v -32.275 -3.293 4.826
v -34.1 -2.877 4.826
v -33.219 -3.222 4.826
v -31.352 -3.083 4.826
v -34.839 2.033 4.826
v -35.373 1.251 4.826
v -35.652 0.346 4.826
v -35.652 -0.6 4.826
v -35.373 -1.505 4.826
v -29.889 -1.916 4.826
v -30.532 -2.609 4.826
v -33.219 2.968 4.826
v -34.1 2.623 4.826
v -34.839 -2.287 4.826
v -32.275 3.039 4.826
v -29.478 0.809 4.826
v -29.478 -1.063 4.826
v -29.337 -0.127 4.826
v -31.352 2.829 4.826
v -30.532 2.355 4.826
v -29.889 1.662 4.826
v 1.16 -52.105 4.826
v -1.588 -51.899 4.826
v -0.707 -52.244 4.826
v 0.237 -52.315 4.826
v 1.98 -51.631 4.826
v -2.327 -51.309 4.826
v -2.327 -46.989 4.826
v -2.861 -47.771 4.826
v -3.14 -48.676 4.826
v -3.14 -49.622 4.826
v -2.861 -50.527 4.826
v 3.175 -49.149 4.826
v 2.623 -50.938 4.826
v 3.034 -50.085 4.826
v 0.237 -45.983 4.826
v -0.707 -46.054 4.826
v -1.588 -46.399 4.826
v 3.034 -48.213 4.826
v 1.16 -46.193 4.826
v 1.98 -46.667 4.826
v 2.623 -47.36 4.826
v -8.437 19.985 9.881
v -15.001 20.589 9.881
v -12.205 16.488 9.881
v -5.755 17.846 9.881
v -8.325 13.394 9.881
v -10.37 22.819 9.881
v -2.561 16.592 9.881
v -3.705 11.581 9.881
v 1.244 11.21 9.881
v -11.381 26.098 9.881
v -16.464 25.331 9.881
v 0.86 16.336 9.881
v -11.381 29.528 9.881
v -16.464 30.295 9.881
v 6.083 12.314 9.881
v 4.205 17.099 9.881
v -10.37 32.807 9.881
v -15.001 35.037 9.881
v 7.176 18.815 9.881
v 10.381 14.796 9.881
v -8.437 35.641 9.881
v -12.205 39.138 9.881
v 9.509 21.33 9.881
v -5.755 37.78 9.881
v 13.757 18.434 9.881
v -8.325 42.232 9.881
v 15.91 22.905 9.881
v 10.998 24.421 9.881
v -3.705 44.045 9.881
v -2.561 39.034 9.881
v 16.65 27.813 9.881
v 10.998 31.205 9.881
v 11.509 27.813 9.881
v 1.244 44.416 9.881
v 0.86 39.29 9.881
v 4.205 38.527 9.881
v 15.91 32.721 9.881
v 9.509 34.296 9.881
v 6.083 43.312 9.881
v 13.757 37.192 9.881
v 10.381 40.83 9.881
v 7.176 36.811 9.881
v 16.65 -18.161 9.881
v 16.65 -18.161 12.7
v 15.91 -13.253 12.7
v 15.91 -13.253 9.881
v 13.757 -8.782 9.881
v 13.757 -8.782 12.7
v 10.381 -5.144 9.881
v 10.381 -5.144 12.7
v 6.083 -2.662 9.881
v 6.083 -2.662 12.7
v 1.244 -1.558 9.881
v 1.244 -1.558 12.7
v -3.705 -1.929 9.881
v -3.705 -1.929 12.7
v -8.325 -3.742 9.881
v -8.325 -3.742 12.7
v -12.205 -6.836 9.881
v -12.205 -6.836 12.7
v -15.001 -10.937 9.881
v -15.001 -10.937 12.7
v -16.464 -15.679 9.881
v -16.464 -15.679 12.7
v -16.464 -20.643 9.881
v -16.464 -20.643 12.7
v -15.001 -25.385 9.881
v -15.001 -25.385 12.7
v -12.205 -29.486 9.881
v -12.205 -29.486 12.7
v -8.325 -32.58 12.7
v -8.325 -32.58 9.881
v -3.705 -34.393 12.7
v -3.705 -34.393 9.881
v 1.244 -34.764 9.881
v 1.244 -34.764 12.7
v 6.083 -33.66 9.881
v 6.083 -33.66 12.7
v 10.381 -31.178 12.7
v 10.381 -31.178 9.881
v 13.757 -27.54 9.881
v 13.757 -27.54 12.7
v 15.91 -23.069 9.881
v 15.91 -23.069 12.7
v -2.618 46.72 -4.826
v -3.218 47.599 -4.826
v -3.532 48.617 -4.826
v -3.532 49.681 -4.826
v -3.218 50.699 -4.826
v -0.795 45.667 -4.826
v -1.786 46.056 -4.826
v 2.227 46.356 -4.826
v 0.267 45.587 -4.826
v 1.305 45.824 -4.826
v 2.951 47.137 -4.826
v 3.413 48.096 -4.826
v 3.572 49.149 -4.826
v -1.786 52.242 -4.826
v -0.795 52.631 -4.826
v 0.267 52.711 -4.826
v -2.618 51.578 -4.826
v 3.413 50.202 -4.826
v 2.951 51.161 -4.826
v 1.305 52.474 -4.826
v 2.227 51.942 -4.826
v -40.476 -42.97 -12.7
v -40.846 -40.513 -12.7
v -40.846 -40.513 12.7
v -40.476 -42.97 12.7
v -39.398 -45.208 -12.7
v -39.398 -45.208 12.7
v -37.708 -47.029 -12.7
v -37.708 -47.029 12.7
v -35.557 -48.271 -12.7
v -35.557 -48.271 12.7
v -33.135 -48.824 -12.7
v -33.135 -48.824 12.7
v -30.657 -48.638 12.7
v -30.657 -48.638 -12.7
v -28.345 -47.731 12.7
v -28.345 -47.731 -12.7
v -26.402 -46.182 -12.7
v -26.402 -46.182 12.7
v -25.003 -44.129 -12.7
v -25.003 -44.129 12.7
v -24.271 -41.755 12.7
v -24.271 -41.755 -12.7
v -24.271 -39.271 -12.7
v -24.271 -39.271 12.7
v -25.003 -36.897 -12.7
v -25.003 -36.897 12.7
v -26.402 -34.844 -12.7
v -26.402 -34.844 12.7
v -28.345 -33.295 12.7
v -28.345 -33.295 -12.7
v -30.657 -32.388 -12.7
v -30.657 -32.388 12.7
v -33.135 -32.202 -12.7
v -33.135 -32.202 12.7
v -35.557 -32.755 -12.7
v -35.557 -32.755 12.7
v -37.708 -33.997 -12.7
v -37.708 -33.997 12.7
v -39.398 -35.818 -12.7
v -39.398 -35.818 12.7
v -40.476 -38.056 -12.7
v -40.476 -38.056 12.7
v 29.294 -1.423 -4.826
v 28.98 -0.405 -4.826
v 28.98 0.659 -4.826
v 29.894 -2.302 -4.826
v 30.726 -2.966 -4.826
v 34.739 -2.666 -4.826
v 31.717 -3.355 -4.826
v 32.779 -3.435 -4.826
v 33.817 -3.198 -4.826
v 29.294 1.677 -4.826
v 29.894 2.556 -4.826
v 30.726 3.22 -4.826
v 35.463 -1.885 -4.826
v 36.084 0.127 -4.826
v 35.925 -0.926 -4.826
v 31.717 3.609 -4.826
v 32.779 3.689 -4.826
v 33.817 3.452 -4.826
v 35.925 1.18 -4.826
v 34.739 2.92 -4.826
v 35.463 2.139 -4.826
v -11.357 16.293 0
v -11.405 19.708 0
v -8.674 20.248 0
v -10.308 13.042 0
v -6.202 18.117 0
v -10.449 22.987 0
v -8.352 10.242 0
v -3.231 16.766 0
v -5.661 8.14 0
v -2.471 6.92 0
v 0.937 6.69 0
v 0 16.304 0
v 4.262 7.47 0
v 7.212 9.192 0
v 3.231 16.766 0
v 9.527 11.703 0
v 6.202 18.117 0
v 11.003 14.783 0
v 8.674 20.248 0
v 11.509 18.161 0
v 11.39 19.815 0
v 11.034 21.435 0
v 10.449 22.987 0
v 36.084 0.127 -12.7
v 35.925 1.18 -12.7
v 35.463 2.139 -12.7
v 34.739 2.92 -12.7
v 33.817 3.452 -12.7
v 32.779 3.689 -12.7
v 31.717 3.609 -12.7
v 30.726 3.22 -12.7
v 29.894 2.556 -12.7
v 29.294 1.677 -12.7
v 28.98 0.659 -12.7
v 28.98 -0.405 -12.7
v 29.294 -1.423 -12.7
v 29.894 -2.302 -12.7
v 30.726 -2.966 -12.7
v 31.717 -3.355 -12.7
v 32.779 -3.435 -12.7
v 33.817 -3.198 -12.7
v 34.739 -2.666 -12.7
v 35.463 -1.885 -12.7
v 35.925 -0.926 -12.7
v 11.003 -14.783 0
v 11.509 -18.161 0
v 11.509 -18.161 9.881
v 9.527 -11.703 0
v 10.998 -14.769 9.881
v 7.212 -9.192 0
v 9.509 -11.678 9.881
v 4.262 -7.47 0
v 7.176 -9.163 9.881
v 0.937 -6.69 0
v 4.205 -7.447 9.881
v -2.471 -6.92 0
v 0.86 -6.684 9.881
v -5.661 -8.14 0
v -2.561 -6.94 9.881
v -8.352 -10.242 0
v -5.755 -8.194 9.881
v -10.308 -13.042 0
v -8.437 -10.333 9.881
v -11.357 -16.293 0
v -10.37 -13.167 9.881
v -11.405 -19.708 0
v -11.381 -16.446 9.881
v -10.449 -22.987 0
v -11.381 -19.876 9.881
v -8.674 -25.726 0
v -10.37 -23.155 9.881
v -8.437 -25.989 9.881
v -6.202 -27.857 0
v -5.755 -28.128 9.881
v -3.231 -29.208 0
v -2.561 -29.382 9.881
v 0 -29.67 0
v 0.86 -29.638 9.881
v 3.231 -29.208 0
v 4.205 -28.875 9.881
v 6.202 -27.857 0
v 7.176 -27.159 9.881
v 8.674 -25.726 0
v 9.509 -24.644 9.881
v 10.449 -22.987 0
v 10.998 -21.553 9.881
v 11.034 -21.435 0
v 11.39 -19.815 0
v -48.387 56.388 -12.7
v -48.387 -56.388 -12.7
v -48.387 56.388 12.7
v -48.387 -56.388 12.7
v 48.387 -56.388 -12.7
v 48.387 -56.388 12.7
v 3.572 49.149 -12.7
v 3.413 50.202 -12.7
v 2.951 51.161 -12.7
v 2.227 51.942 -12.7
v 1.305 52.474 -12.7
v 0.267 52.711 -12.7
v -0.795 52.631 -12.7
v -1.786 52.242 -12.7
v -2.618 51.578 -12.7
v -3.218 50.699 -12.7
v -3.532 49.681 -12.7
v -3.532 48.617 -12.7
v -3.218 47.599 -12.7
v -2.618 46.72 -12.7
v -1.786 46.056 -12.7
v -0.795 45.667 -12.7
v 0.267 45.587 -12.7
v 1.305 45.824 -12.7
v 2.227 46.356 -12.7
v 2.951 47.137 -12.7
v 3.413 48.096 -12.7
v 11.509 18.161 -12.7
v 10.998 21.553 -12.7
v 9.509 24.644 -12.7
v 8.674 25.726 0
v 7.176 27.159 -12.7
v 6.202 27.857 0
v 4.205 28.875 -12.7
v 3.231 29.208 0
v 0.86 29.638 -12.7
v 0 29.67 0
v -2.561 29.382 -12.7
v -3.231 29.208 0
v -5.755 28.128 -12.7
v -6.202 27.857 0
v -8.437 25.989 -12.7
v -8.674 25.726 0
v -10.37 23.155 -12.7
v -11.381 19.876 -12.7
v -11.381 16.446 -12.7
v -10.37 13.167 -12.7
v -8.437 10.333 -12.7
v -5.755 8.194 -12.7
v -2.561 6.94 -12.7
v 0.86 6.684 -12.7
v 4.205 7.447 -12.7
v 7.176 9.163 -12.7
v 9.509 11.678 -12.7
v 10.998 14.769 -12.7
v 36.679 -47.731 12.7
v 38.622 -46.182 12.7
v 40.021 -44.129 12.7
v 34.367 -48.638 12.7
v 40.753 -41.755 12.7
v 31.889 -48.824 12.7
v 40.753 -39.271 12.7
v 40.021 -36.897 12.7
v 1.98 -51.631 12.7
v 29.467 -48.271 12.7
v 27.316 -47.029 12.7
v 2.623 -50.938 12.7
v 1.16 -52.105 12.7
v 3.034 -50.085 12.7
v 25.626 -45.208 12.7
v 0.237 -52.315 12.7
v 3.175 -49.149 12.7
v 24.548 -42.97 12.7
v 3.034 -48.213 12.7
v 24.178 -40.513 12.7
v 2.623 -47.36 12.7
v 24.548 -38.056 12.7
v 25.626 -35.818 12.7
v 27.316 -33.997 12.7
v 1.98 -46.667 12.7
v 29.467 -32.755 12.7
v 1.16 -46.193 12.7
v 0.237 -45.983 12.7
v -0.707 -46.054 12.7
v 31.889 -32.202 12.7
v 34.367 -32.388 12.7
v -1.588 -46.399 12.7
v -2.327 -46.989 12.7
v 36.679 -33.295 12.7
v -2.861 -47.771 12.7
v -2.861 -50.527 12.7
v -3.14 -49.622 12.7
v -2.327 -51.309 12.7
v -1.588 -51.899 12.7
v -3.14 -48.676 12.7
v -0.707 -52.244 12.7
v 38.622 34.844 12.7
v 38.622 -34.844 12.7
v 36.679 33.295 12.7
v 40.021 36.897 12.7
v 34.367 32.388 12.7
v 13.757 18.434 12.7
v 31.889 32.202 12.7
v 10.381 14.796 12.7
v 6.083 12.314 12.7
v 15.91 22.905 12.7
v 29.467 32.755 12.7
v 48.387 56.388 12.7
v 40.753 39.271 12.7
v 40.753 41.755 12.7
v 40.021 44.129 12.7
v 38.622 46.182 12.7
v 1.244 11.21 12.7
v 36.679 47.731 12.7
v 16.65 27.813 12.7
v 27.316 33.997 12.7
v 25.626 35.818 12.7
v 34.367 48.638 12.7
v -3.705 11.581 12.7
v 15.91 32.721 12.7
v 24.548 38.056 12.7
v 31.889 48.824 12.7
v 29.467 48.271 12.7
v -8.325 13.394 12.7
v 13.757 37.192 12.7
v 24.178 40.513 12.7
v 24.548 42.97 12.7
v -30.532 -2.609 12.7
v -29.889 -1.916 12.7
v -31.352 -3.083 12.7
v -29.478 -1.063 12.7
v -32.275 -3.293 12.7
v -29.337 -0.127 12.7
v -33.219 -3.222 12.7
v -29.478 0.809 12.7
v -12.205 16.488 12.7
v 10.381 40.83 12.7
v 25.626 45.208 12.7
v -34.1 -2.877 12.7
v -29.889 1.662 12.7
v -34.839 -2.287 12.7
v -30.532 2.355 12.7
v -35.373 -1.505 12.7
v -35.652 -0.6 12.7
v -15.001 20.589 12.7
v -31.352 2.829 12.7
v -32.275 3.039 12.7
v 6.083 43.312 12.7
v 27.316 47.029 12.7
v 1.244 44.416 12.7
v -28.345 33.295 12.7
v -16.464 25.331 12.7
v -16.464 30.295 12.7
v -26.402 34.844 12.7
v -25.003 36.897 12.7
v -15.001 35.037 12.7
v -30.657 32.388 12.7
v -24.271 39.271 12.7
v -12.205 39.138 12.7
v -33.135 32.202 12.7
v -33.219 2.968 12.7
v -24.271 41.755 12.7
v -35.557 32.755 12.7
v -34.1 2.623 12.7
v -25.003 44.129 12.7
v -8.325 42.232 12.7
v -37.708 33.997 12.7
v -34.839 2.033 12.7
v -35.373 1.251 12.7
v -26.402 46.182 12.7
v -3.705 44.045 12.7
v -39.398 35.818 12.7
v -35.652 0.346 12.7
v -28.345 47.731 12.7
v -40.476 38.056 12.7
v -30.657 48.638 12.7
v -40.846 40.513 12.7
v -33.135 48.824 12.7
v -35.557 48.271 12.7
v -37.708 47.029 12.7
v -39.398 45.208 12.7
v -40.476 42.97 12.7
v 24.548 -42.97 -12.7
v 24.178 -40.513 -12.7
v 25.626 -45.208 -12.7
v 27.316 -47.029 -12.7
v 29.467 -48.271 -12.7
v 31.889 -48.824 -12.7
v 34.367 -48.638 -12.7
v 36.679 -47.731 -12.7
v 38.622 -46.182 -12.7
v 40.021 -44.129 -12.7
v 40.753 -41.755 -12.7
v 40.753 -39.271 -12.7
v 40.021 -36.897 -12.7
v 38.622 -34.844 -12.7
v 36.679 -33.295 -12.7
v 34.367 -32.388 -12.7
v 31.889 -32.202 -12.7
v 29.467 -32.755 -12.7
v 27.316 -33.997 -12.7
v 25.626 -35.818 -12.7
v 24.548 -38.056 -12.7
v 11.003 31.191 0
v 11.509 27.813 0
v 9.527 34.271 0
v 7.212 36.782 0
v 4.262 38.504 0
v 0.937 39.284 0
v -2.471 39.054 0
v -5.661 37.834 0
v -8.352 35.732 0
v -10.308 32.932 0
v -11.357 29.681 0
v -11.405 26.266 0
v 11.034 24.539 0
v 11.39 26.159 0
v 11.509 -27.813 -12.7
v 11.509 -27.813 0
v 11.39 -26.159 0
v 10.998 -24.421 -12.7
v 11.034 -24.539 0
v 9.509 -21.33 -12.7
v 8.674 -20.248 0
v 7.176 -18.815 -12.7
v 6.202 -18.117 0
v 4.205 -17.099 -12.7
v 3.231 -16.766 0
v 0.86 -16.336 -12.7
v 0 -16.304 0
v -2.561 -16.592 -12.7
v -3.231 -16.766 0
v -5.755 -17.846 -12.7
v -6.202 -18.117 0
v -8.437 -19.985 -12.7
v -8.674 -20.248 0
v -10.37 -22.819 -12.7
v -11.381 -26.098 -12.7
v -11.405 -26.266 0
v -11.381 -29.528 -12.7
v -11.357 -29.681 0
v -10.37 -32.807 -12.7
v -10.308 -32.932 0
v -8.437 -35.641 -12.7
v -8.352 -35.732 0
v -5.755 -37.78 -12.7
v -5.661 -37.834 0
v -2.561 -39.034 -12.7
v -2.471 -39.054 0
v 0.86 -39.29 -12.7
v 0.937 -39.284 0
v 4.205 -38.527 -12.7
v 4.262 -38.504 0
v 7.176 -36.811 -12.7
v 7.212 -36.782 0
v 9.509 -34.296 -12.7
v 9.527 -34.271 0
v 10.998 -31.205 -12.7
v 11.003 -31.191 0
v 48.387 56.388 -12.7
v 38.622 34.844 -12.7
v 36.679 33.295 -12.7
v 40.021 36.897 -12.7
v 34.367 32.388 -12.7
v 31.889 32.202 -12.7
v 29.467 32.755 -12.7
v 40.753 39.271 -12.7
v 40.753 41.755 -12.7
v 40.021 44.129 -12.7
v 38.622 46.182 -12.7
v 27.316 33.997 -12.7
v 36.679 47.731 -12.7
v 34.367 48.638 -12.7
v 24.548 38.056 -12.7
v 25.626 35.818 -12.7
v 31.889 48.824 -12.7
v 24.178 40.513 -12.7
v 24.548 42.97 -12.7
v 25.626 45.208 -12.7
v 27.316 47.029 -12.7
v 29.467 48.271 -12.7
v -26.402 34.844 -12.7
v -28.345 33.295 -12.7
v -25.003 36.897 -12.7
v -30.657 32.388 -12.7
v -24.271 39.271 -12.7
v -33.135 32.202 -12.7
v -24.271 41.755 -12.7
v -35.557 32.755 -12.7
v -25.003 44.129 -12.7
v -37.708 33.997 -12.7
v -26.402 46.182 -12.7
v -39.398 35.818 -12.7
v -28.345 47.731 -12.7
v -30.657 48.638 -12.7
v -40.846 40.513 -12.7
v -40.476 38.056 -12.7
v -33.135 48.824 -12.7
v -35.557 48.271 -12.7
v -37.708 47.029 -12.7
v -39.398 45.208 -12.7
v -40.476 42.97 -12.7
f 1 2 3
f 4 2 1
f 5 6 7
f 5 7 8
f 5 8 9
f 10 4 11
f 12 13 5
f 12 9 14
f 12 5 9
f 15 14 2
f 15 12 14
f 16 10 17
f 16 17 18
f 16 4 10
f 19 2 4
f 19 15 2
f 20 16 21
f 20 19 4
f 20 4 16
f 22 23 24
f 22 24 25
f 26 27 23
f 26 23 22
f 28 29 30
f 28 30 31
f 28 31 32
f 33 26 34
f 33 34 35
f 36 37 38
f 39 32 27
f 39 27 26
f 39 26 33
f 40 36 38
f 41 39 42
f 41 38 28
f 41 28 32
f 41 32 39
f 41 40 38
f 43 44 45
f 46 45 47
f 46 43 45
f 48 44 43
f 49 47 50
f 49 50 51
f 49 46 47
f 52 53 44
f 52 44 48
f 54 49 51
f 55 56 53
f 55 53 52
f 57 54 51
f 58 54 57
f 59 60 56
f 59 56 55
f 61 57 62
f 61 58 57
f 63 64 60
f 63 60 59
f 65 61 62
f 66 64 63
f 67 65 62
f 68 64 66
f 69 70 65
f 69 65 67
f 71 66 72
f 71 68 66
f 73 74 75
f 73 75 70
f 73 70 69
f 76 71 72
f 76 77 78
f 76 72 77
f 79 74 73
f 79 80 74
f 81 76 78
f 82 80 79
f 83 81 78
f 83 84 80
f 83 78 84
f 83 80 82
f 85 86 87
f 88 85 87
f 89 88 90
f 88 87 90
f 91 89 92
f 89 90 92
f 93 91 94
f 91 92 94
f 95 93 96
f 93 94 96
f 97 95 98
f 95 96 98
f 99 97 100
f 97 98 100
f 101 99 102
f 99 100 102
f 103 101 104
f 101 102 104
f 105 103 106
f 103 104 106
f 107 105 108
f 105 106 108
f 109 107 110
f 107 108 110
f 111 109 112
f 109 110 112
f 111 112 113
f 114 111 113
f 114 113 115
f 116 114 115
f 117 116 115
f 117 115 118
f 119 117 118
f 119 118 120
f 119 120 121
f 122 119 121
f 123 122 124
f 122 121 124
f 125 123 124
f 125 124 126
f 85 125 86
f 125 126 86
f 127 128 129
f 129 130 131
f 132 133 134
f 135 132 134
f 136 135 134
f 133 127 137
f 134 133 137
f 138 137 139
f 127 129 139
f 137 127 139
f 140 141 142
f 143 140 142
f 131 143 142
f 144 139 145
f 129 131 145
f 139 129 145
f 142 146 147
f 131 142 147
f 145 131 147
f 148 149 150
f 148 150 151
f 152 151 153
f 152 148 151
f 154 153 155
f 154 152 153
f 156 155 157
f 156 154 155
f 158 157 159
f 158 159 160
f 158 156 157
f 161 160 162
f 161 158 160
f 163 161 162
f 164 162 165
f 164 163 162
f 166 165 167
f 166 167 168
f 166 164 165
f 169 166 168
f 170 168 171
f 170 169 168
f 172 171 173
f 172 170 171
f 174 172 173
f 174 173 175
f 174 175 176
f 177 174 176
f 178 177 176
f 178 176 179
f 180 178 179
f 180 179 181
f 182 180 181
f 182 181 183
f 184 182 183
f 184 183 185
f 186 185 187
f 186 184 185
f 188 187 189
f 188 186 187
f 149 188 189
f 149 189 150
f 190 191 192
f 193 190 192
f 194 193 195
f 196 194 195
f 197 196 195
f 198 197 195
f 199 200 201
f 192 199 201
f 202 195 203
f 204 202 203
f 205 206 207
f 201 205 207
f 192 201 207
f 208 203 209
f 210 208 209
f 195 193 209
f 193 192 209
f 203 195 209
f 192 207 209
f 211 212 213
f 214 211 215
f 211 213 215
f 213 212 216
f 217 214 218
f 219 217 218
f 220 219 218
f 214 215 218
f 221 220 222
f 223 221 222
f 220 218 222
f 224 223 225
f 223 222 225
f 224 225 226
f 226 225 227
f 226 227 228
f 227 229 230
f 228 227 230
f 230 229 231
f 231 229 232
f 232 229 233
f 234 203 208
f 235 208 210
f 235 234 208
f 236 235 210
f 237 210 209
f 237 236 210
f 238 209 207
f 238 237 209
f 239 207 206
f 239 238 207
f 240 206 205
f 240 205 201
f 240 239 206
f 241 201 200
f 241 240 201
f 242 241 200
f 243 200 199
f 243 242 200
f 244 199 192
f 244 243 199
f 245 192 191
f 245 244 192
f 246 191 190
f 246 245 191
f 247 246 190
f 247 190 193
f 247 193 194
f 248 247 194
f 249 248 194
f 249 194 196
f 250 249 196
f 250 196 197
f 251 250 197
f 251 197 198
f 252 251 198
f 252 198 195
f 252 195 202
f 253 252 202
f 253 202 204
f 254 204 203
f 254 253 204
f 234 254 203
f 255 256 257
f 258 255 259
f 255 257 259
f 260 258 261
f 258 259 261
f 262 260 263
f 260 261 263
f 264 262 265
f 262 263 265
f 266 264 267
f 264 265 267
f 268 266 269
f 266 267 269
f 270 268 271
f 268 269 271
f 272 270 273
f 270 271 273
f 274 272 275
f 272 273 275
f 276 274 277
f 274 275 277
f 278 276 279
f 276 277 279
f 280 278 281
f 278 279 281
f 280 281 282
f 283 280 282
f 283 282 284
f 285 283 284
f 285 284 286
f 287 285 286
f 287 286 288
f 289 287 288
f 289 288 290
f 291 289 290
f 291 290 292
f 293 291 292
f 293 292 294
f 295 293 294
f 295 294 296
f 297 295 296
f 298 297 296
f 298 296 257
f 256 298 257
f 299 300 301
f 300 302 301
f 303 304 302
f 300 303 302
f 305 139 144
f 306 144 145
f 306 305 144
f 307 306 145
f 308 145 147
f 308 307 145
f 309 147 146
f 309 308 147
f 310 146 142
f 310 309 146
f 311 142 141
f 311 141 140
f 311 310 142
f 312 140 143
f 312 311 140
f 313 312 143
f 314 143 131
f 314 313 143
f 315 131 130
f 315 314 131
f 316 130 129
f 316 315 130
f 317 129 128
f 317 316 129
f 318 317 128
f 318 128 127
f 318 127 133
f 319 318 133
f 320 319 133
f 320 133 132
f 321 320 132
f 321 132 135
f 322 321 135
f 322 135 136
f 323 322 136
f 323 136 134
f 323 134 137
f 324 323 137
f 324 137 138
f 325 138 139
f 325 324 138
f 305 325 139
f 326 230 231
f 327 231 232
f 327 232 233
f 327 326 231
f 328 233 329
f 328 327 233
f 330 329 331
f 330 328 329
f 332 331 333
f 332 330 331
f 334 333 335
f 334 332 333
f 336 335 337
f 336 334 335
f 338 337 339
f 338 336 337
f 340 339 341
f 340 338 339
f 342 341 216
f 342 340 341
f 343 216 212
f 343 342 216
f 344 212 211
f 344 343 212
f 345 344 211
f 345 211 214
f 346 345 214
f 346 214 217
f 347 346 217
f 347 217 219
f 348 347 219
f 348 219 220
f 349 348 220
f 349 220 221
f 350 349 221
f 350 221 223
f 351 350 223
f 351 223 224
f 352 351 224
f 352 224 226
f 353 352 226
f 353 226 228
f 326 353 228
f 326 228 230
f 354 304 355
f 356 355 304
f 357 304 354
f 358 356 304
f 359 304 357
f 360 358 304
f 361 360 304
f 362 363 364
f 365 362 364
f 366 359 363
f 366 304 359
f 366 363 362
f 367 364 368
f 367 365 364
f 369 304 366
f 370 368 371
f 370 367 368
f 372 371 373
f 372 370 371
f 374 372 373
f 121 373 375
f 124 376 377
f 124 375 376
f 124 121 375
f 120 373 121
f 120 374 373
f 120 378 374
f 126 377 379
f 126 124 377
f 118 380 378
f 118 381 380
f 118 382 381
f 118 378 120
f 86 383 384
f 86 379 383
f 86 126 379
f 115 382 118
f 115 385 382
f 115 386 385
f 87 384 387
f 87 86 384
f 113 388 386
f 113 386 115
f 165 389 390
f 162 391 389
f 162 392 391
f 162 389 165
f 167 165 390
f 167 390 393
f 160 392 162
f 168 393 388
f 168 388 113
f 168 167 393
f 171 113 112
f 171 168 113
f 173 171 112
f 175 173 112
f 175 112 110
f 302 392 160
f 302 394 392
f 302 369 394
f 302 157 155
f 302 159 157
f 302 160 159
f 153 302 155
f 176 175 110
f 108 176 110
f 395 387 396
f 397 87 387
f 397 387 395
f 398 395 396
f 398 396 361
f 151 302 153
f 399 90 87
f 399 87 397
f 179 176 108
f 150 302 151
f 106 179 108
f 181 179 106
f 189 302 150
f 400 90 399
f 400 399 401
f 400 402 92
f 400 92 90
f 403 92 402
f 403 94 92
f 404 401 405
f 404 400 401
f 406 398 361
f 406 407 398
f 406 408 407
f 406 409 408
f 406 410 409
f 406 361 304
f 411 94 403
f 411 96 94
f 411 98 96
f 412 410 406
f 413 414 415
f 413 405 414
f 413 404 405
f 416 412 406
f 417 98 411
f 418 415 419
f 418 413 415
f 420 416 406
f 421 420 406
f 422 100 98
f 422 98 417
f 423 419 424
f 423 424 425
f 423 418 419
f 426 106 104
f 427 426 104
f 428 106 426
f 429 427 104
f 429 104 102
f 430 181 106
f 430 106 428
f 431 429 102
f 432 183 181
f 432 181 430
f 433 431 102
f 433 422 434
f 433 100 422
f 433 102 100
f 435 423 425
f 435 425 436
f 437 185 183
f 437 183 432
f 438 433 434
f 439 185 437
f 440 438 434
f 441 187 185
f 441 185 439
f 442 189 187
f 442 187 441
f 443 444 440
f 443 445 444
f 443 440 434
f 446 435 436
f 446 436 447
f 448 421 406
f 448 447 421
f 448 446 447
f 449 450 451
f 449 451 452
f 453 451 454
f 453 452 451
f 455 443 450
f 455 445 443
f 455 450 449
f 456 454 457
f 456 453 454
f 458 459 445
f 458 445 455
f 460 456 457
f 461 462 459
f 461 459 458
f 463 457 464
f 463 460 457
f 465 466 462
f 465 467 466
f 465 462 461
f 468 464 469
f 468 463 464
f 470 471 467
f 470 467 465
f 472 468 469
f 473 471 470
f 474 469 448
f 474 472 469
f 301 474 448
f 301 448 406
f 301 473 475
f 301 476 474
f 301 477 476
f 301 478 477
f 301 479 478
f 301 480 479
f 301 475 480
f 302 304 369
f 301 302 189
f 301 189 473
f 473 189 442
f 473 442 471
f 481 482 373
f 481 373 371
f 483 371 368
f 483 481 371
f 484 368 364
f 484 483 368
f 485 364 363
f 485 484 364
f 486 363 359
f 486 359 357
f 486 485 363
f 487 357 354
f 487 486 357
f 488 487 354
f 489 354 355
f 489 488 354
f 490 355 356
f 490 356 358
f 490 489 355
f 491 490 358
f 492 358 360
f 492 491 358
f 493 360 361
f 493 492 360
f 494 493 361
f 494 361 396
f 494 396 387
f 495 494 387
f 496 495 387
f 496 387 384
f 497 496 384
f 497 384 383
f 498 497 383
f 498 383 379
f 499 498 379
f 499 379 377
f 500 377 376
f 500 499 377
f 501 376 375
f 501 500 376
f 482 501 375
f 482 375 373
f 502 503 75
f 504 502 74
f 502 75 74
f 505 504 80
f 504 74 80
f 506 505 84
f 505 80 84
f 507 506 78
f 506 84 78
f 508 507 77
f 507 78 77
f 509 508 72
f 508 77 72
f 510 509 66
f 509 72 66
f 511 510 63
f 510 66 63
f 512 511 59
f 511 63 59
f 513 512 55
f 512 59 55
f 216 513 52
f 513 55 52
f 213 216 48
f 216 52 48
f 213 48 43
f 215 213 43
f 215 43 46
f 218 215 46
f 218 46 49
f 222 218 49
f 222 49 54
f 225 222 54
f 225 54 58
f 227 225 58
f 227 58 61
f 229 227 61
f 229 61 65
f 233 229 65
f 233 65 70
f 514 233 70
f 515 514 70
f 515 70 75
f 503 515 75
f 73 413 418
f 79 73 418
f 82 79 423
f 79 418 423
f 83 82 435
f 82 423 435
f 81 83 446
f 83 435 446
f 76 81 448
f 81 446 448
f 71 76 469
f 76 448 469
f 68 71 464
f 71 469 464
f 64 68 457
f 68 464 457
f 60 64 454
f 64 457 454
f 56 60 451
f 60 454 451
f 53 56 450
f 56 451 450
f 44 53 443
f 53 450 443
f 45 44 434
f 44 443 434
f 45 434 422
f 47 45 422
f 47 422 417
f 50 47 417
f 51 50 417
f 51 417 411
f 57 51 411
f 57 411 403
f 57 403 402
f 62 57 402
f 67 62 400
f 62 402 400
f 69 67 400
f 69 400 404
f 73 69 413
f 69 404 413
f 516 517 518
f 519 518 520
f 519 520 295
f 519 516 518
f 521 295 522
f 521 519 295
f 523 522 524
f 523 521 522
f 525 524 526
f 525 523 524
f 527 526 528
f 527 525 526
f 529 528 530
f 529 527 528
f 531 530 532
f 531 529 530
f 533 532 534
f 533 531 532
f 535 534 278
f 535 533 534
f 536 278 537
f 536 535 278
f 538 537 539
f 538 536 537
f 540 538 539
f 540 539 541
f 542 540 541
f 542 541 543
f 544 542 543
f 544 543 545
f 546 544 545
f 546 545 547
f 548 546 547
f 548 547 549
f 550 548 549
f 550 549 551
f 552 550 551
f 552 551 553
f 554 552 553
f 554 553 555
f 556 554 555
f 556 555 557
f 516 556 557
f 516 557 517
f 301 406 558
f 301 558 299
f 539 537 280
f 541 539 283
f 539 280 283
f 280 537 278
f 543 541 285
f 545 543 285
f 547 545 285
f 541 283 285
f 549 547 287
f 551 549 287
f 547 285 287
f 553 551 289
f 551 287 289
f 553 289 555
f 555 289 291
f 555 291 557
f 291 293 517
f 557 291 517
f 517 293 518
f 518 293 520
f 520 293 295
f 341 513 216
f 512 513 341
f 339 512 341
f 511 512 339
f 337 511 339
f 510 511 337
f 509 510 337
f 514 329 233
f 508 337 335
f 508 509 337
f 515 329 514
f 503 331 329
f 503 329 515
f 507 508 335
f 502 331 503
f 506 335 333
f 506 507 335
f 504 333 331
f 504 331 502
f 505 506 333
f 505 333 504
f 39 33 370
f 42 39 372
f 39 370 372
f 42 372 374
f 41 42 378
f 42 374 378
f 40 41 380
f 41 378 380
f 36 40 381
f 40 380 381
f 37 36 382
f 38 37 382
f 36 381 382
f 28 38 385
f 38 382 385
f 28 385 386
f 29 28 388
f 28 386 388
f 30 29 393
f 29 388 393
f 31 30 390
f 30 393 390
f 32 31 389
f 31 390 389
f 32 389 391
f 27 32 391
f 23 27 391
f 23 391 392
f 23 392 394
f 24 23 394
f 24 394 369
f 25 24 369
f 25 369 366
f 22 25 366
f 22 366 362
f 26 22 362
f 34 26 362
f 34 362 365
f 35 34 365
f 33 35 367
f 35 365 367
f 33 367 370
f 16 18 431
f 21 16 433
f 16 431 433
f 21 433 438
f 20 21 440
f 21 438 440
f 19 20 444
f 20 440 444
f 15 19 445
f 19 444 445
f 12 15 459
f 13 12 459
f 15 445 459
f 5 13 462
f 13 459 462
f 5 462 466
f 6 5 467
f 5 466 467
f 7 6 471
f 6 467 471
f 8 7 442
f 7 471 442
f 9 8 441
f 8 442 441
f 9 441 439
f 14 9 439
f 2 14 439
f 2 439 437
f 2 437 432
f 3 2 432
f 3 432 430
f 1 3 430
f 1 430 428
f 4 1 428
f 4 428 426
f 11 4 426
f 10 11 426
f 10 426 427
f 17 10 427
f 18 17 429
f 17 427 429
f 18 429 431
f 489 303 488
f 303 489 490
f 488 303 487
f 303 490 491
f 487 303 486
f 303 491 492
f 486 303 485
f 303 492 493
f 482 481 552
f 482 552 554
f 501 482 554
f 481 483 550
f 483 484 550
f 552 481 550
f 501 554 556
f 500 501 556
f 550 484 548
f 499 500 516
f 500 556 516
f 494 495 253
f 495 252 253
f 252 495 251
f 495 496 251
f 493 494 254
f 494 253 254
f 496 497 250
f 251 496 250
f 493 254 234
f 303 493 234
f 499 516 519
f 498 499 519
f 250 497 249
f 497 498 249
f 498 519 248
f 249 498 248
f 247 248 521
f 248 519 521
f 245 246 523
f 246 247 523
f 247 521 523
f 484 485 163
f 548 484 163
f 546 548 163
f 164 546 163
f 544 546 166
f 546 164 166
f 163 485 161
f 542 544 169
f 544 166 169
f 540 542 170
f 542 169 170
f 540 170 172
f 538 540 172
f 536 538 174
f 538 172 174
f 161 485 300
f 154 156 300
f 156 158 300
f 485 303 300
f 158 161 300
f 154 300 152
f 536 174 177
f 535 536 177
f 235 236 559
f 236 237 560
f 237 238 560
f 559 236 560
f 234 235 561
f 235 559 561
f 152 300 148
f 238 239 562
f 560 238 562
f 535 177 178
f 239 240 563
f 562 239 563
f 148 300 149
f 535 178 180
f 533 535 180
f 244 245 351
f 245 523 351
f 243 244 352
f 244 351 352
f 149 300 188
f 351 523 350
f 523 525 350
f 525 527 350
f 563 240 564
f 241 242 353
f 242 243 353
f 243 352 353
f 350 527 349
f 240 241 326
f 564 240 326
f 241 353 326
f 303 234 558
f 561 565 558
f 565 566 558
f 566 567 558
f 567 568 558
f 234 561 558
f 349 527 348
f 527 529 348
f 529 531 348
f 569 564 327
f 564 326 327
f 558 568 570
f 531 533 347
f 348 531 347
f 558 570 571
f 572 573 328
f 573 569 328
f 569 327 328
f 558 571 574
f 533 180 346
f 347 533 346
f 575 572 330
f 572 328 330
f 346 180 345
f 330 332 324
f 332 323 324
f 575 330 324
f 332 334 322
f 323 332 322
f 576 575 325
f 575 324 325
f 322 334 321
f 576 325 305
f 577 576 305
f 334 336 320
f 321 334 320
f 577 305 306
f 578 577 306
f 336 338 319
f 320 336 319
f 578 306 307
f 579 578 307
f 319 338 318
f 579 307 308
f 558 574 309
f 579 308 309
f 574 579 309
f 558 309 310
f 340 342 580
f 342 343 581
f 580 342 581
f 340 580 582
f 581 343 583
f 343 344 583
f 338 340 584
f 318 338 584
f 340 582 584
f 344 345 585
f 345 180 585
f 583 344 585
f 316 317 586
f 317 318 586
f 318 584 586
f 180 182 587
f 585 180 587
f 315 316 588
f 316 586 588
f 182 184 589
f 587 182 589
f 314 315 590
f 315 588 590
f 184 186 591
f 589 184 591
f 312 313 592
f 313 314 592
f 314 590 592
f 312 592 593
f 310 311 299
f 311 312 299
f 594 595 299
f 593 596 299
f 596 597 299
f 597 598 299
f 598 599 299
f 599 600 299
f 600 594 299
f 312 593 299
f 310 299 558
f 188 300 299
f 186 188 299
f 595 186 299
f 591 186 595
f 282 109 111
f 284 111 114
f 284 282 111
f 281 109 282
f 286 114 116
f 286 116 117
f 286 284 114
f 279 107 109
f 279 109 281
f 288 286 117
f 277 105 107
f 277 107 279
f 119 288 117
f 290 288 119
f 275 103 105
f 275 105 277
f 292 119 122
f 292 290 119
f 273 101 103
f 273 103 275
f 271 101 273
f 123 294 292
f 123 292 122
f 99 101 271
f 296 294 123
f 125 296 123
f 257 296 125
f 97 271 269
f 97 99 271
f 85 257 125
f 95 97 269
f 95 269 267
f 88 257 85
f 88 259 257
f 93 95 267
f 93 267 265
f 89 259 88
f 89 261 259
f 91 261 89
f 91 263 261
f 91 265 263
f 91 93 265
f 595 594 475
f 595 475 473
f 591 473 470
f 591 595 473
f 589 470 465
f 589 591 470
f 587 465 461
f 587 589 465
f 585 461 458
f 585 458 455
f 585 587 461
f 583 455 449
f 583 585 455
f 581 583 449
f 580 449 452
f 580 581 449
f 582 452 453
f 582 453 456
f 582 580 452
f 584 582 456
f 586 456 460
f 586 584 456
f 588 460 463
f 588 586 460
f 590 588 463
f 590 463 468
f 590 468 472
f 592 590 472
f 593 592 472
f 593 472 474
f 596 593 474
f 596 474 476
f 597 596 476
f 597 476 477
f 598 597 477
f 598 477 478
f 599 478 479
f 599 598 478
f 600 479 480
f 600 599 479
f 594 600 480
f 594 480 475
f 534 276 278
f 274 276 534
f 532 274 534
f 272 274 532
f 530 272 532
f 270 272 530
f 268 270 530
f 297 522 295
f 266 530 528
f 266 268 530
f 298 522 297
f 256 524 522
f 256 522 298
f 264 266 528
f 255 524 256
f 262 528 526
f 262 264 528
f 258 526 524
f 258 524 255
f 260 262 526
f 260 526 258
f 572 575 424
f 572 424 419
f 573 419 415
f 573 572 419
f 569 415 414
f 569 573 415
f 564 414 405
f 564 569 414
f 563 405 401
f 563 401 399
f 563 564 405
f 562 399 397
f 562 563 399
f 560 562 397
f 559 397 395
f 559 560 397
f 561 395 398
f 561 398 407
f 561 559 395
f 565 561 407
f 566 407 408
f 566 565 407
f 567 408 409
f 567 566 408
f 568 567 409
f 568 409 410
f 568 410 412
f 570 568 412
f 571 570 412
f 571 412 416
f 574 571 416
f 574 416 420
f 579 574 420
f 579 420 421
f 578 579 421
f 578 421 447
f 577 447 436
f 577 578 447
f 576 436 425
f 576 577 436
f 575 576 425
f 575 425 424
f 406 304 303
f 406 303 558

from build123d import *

# Parameters (mm, degrees)
SKETCH1_W           = 112.776
SKETCH1_H           = 96.774
BOSS_EXTRUDE1_DEPTH = 12.7
CUT_EXTRUDE2_START  = -12.7
SKETCH2_R           = 8.334375
CUT_EXTRUDE2_DEPTH  = 25.4
CUT_EXTRUDE4_START  = -12.7
SKETCH3_R           = 8.334375
CUT_EXTRUDE4_DEPTH  = 25.4
CUT_EXTRUDE6_START  = -12.7
SKETCH4_R           = 11.509375
CUT_EXTRUDE6_DEPTH  = 12.7
CUT_EXTRUDE8_START  = -12.7
SKETCH5_R           = 11.509375
CUT_EXTRUDE8_DEPTH  = 12.7
CUT_EXTRUDE10_START = 12.7
SKETCH6_R           = 11.509375
CUT_EXTRUDE10_DEPTH = 12.7
CUT_EXTRUDE12_START = 12.7
SKETCH7_R           = 11.509375
CUT_EXTRUDE12_DEPTH = 12.7
CUT_EXTRUDE14_START = 12.7
SKETCH8_R           = 16.6497
CUT_EXTRUDE14_DEPTH = 2.8194
CUT_EXTRUDE16_START = 12.7
SKETCH9_R           = 16.6497
CUT_EXTRUDE16_DEPTH = 2.8194
CUT_EXTRUDE18_START = -12.7
SKETCH10_R          = 3.571875
CUT_EXTRUDE18_DEPTH = 7.874
CUT_EXTRUDE20_START = -12.7
SKETCH11_R          = 3.571875
CUT_EXTRUDE20_DEPTH = 7.874
CUT_EXTRUDE22_START = 12.7
SKETCH12_R          = 3.175
CUT_EXTRUDE22_DEPTH = 7.874
CUT_EXTRUDE24_START = 12.7
SKETCH13_R          = 3.175
CUT_EXTRUDE24_DEPTH = 7.874


with BuildPart() as part:
    # Sketch1 → Boss-Extrude1 (new, symmetric)
    with BuildSketch(Plane(origin=(0, 0, 0), x_dir=(0, 1, 0), z_dir=(0, 0, 1))):
        Rectangle(SKETCH1_W, SKETCH1_H)
    extrude(amount=BOSS_EXTRUDE1_DEPTH, both=True)

    # Sketch2 → Cut-Extrude2 (cut)
    with BuildSketch(Plane(origin=(0, 0, 0), x_dir=(0, 1, 0), z_dir=(0, 0, 1)).offset(CUT_EXTRUDE2_START)):
        with Locations(Location((-40.513, -32.512, 0), (0, 0, 90))):
            Circle(SKETCH2_R)
    extrude(amount=CUT_EXTRUDE2_DEPTH, mode=Mode.SUBTRACT)

    # Sketch3 → Cut-Extrude4 (cut)
    with BuildSketch(Plane(origin=(0, 0, 0), x_dir=(0, 1, 0), z_dir=(0, 0, 1)).offset(CUT_EXTRUDE4_START)):
        with Locations(Location((40.513, -32.512, 0), (0, 0, 90))):
            Circle(SKETCH3_R)
        with Locations(Location((-40.513, 32.512, 0), (0, 0, 90))):
            Circle(SKETCH3_R)
        with Locations(Location((40.513, 32.512, 0), (0, 0, 90))):
            Circle(SKETCH3_R)
    extrude(amount=CUT_EXTRUDE4_DEPTH, mode=Mode.SUBTRACT)

    # Sketch4 → Cut-Extrude6 (cut)
    with BuildSketch(Plane(origin=(0, 0, 0), x_dir=(0, 1, 0), z_dir=(0, 0, 1)).offset(CUT_EXTRUDE6_START)):
        with Locations(Location((-27.813, 0, 0), (0, 0, 270))):
            Circle(SKETCH4_R)
    extrude(amount=CUT_EXTRUDE6_DEPTH, mode=Mode.SUBTRACT)

    # Sketch5 → Cut-Extrude8 (cut)
    with BuildSketch(Plane(origin=(0, 0, 0), x_dir=(0, 1, 0), z_dir=(0, 0, 1)).offset(CUT_EXTRUDE8_START)):
        with Locations(Location((18.161, 0, 0), (0, 0, 270))):
            Circle(SKETCH5_R)
    extrude(amount=CUT_EXTRUDE8_DEPTH, mode=Mode.SUBTRACT)

    # Sketch6 → Cut-Extrude10 (cut)
    with BuildSketch(Plane(origin=(0, 0, 0), x_dir=(0, 1, 0), z_dir=(0, 0, 1)).offset(CUT_EXTRUDE10_START)):
        with Locations(Location((-18.161, 0, 0), (0, 0, 270))):
            Circle(SKETCH6_R)
    extrude(amount=-CUT_EXTRUDE10_DEPTH, mode=Mode.SUBTRACT)

    # Sketch7 → Cut-Extrude12 (cut)
    with BuildSketch(Plane(origin=(0, 0, 0), x_dir=(0, 1, 0), z_dir=(0, 0, 1)).offset(CUT_EXTRUDE12_START)):
        with Locations(Location((27.813, 0, 0), (0, 0, 270))):
            Circle(SKETCH7_R)
    extrude(amount=-CUT_EXTRUDE12_DEPTH, mode=Mode.SUBTRACT)

    # Sketch8 → Cut-Extrude14 (cut)
    with BuildSketch(Plane(origin=(0, 0, 0), x_dir=(0, 1, 0), z_dir=(0, 0, 1)).offset(CUT_EXTRUDE14_START)):
        with Locations(Location((-18.161, 0, 0), (0, 0, 270))):
            Circle(SKETCH8_R)
    extrude(amount=-CUT_EXTRUDE14_DEPTH, mode=Mode.SUBTRACT)

    # Sketch9 → Cut-Extrude16 (cut)
    with BuildSketch(Plane(origin=(0, 0, 0), x_dir=(0, 1, 0), z_dir=(0, 0, 1)).offset(CUT_EXTRUDE16_START)):
        with Locations(Location((27.813, 0, 0), (0, 0, 270))):
            Circle(SKETCH9_R)
    extrude(amount=-CUT_EXTRUDE16_DEPTH, mode=Mode.SUBTRACT)

    # Sketch10 → Cut-Extrude18 (cut)
    with BuildSketch(Plane(origin=(0, 0, 0), x_dir=(0, 1, 0), z_dir=(0, 0, 1)).offset(CUT_EXTRUDE18_START)):
        with Locations(Location((49.149, 0, 0), (0, 0, 270))):
            Circle(SKETCH10_R)
    extrude(amount=CUT_EXTRUDE18_DEPTH, mode=Mode.SUBTRACT)

    # Sketch11 → Cut-Extrude20 (cut)
    with BuildSketch(Plane(origin=(0, 0, 0), x_dir=(0, 1, 0), z_dir=(0, 0, 1)).offset(CUT_EXTRUDE20_START)):
        with Locations(Location((0.127, -32.512, 0), (0, 0, 270))):
            Circle(SKETCH11_R)
    extrude(amount=CUT_EXTRUDE20_DEPTH, mode=Mode.SUBTRACT)

    # Sketch12 → Cut-Extrude22 (cut)
    with BuildSketch(Plane(origin=(0, 0, 0), x_dir=(0, 1, 0), z_dir=(0, 0, 1)).offset(CUT_EXTRUDE22_START)):
        with Locations(Location((-49.149, 0, 0), (0, 0, 270))):
            Circle(SKETCH12_R)
    extrude(amount=-CUT_EXTRUDE22_DEPTH, mode=Mode.SUBTRACT)

    # Sketch13 → Cut-Extrude24 (cut)
    with BuildSketch(Plane(origin=(0, 0, 0), x_dir=(0, 1, 0), z_dir=(0, 0, 1)).offset(CUT_EXTRUDE24_START)):
        with Locations(Location((-0.127, 32.512, 0), (0, 0, 270))):
            Circle(SKETCH13_R)
    extrude(amount=-CUT_EXTRUDE24_DEPTH, mode=Mode.SUBTRACT)


solid = part.part
